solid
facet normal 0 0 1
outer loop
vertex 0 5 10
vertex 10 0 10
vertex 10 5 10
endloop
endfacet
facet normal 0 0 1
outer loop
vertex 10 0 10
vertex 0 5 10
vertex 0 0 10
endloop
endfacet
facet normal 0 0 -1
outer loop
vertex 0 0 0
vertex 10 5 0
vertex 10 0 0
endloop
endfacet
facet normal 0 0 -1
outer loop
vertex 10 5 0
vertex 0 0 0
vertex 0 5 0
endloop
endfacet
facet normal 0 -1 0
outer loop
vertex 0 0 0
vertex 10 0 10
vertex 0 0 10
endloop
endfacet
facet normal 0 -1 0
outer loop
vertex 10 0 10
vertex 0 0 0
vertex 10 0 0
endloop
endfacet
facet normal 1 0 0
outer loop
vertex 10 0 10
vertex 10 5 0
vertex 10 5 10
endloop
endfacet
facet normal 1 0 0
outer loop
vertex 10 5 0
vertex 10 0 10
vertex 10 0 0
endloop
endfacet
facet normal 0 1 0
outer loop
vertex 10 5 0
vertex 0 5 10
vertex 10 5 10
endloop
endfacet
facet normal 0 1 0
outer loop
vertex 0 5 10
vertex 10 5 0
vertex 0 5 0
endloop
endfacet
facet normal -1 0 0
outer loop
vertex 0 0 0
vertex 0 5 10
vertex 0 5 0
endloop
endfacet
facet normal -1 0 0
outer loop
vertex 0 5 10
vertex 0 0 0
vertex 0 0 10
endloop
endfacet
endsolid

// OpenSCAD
// Construct: arithmetic expressions (+ - * / %) computing dimensions.
base = 4;
side = base * 3 - 2;
gap = 20 % 7;
cube([side, side / 2, base + gap]);
